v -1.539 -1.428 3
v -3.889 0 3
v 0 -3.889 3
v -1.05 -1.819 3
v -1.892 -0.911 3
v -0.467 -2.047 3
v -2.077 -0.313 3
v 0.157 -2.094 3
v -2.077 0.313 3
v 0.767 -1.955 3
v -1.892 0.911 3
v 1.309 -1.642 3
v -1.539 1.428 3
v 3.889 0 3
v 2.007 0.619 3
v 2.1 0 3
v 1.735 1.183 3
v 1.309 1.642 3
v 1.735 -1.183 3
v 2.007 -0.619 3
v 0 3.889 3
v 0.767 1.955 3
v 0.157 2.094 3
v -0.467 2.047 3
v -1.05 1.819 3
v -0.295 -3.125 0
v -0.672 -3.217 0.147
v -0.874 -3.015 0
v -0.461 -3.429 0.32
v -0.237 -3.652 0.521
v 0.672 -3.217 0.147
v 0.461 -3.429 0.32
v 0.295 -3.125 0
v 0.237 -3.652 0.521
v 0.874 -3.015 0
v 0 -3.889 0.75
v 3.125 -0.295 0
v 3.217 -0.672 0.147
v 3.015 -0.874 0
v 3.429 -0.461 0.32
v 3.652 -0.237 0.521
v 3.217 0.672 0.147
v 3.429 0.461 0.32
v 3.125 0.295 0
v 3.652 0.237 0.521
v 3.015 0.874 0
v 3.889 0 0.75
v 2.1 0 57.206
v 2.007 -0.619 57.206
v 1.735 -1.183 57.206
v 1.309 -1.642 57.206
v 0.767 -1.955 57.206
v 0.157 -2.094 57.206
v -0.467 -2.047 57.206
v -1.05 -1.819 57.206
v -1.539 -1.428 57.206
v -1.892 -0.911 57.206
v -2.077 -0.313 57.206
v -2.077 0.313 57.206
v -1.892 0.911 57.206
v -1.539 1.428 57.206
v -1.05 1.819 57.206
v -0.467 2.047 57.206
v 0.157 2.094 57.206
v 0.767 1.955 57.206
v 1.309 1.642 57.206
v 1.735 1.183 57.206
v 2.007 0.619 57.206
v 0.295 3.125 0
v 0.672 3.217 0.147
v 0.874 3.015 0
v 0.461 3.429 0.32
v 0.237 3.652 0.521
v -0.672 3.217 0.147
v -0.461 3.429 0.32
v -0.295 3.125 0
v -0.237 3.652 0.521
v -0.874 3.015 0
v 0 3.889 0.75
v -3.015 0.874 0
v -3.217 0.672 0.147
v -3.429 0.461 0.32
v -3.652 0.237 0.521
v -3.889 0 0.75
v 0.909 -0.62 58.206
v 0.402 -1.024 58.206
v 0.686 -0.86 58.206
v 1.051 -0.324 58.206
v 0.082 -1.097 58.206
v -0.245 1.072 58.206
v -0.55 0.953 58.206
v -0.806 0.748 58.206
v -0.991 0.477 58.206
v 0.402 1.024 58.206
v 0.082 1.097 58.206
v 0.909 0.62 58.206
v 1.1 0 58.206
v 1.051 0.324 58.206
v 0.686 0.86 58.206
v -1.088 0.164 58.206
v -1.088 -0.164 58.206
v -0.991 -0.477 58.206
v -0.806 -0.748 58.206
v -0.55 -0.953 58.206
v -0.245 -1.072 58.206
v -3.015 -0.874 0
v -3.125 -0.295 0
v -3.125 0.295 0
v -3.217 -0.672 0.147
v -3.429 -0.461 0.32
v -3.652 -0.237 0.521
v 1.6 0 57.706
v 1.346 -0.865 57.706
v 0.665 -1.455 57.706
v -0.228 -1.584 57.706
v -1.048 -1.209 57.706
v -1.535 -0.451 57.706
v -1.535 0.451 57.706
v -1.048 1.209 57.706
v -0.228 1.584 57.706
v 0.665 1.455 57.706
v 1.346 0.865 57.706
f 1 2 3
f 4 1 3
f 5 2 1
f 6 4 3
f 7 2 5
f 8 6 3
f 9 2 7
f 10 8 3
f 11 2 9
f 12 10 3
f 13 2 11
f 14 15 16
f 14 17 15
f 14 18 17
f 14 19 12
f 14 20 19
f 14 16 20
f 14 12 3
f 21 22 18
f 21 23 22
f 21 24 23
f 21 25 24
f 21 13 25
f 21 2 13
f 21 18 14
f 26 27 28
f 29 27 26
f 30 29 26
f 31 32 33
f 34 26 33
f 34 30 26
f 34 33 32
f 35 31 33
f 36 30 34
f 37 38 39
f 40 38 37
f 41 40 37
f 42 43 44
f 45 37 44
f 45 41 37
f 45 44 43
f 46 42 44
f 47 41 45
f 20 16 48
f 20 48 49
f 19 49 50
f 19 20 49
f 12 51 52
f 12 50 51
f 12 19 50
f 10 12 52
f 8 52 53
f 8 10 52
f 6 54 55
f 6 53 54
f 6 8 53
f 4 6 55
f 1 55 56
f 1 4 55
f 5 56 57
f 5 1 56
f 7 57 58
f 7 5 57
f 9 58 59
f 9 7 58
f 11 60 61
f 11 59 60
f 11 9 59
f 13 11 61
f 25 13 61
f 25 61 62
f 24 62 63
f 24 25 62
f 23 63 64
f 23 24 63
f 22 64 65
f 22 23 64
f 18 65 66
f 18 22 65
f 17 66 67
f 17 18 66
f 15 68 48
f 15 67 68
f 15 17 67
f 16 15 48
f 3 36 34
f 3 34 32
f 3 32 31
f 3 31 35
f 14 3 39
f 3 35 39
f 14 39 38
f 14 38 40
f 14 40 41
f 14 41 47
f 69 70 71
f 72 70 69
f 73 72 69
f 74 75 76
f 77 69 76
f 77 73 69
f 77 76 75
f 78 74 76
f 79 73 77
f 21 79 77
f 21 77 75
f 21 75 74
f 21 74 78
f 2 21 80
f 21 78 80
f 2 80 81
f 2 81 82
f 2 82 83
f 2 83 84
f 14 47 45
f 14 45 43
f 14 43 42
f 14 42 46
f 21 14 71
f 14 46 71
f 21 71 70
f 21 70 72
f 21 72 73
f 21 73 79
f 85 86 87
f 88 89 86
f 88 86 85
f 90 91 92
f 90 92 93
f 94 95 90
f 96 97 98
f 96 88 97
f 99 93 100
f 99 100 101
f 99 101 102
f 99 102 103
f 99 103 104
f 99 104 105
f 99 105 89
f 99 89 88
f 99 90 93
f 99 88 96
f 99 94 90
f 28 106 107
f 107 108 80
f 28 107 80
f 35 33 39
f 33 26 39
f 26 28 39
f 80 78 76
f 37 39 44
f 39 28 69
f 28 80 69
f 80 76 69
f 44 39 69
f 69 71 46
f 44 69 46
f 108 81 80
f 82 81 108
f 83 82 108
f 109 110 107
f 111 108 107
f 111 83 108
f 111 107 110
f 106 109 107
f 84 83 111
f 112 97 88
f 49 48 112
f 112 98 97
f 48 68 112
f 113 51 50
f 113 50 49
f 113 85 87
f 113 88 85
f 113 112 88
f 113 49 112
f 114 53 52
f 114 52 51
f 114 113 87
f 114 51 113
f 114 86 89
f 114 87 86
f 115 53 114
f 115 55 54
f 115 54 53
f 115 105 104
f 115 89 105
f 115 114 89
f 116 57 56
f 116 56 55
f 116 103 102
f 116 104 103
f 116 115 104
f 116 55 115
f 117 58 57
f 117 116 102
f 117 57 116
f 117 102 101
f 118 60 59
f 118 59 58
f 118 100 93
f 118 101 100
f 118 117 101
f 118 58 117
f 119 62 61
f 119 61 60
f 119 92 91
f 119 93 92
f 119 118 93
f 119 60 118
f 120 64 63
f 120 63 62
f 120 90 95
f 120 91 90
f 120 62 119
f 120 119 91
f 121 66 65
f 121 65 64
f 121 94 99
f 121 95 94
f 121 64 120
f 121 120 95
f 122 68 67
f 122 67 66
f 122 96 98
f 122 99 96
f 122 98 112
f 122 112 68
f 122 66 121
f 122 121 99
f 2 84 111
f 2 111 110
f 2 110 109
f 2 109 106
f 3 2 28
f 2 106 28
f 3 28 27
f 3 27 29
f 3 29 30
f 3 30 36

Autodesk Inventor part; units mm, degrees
ref_plane "YZ Plane" through (0, 0, 0) normal (1, 0, 0) x (0, 1, 0)
ref_plane "XZ Plane" through (0, 0, 0) normal (0, 1, 0) x (-1, 0, 0)
ref_plane "XY Plane" through (0, 0, 0) normal (0, 0, 1) x (1, 0, 0)
sketch "Sketch1" plane through (0, 0, 0) normal (0, 0, 1) x (1, 0, 0)
  line L0 (-3.8891, 0) -> (0, -3.8891)
  line L1 (0, -3.8891) -> (3.8891, 0)
  line L2 (3.8891, 0) -> (0, 3.8891)
  line L3 (0, 3.8891) -> (-3.8891, 0)
  line L4 (-3.8891, 0) -> (3.8891, 0) construction
  line L5 (0, -3.8891) -> (0, 3.8891) construction
  point P0 (0, 0)
  dimension "d0" = 5.5
  dimension "d1" = 5.5
  dimension "d2" = 90
  dimension "d3" = 5.5
  dimension "d4" = 90
  dimension "d5" = 0
  dimension "d6" = 0
extrude "Extrusion1" add sketch "Sketch1" along normal blind 3
sketch "Sketch2" plane through (0, 0, 0) normal (1, 0, 0) x (0, 1, 0)
  line L0 (3.8891, 0) -> (0, 0) projected
  line L1 (3.8891, 0) -> (3.8891, 0.75)
  line L2 (3.8891, 0.75) -> (3.1391, 0)
  line L3 (3.8891, 0) -> (3.1391, 0)
  line L4 (-3.8891, 3) -> (0, 3) projected
  line L5 (0, 3) -> (0, 0)
  dimension "d9" = 0.75
  dimension "d10" = 0.75
revolve "Revolution1" cut sketch "Sketch2" angle 360 about axis through (0, 0, 3) along (0, 0, -1)
sketch "Sketch3" plane through (0, 0, 3) normal (0, 0, 1) x (1, 0, 0)
  circle A0 centre (0, 0) radius 2.1
  dimension "d12" = 4.2
extrude "Extrusion2" add sketch "Sketch3" along normal blind 55.206
chamfer "Chamfer1" distance 1 angle 45 1 edges at (-2.1, 0, 58.206)
thread "Thread1" size "M4.5x0.75" class "6g" standard "ANSI Metric M Profile" length 5
properties part number "ES117_Bolt" material "Stainless Steel"
